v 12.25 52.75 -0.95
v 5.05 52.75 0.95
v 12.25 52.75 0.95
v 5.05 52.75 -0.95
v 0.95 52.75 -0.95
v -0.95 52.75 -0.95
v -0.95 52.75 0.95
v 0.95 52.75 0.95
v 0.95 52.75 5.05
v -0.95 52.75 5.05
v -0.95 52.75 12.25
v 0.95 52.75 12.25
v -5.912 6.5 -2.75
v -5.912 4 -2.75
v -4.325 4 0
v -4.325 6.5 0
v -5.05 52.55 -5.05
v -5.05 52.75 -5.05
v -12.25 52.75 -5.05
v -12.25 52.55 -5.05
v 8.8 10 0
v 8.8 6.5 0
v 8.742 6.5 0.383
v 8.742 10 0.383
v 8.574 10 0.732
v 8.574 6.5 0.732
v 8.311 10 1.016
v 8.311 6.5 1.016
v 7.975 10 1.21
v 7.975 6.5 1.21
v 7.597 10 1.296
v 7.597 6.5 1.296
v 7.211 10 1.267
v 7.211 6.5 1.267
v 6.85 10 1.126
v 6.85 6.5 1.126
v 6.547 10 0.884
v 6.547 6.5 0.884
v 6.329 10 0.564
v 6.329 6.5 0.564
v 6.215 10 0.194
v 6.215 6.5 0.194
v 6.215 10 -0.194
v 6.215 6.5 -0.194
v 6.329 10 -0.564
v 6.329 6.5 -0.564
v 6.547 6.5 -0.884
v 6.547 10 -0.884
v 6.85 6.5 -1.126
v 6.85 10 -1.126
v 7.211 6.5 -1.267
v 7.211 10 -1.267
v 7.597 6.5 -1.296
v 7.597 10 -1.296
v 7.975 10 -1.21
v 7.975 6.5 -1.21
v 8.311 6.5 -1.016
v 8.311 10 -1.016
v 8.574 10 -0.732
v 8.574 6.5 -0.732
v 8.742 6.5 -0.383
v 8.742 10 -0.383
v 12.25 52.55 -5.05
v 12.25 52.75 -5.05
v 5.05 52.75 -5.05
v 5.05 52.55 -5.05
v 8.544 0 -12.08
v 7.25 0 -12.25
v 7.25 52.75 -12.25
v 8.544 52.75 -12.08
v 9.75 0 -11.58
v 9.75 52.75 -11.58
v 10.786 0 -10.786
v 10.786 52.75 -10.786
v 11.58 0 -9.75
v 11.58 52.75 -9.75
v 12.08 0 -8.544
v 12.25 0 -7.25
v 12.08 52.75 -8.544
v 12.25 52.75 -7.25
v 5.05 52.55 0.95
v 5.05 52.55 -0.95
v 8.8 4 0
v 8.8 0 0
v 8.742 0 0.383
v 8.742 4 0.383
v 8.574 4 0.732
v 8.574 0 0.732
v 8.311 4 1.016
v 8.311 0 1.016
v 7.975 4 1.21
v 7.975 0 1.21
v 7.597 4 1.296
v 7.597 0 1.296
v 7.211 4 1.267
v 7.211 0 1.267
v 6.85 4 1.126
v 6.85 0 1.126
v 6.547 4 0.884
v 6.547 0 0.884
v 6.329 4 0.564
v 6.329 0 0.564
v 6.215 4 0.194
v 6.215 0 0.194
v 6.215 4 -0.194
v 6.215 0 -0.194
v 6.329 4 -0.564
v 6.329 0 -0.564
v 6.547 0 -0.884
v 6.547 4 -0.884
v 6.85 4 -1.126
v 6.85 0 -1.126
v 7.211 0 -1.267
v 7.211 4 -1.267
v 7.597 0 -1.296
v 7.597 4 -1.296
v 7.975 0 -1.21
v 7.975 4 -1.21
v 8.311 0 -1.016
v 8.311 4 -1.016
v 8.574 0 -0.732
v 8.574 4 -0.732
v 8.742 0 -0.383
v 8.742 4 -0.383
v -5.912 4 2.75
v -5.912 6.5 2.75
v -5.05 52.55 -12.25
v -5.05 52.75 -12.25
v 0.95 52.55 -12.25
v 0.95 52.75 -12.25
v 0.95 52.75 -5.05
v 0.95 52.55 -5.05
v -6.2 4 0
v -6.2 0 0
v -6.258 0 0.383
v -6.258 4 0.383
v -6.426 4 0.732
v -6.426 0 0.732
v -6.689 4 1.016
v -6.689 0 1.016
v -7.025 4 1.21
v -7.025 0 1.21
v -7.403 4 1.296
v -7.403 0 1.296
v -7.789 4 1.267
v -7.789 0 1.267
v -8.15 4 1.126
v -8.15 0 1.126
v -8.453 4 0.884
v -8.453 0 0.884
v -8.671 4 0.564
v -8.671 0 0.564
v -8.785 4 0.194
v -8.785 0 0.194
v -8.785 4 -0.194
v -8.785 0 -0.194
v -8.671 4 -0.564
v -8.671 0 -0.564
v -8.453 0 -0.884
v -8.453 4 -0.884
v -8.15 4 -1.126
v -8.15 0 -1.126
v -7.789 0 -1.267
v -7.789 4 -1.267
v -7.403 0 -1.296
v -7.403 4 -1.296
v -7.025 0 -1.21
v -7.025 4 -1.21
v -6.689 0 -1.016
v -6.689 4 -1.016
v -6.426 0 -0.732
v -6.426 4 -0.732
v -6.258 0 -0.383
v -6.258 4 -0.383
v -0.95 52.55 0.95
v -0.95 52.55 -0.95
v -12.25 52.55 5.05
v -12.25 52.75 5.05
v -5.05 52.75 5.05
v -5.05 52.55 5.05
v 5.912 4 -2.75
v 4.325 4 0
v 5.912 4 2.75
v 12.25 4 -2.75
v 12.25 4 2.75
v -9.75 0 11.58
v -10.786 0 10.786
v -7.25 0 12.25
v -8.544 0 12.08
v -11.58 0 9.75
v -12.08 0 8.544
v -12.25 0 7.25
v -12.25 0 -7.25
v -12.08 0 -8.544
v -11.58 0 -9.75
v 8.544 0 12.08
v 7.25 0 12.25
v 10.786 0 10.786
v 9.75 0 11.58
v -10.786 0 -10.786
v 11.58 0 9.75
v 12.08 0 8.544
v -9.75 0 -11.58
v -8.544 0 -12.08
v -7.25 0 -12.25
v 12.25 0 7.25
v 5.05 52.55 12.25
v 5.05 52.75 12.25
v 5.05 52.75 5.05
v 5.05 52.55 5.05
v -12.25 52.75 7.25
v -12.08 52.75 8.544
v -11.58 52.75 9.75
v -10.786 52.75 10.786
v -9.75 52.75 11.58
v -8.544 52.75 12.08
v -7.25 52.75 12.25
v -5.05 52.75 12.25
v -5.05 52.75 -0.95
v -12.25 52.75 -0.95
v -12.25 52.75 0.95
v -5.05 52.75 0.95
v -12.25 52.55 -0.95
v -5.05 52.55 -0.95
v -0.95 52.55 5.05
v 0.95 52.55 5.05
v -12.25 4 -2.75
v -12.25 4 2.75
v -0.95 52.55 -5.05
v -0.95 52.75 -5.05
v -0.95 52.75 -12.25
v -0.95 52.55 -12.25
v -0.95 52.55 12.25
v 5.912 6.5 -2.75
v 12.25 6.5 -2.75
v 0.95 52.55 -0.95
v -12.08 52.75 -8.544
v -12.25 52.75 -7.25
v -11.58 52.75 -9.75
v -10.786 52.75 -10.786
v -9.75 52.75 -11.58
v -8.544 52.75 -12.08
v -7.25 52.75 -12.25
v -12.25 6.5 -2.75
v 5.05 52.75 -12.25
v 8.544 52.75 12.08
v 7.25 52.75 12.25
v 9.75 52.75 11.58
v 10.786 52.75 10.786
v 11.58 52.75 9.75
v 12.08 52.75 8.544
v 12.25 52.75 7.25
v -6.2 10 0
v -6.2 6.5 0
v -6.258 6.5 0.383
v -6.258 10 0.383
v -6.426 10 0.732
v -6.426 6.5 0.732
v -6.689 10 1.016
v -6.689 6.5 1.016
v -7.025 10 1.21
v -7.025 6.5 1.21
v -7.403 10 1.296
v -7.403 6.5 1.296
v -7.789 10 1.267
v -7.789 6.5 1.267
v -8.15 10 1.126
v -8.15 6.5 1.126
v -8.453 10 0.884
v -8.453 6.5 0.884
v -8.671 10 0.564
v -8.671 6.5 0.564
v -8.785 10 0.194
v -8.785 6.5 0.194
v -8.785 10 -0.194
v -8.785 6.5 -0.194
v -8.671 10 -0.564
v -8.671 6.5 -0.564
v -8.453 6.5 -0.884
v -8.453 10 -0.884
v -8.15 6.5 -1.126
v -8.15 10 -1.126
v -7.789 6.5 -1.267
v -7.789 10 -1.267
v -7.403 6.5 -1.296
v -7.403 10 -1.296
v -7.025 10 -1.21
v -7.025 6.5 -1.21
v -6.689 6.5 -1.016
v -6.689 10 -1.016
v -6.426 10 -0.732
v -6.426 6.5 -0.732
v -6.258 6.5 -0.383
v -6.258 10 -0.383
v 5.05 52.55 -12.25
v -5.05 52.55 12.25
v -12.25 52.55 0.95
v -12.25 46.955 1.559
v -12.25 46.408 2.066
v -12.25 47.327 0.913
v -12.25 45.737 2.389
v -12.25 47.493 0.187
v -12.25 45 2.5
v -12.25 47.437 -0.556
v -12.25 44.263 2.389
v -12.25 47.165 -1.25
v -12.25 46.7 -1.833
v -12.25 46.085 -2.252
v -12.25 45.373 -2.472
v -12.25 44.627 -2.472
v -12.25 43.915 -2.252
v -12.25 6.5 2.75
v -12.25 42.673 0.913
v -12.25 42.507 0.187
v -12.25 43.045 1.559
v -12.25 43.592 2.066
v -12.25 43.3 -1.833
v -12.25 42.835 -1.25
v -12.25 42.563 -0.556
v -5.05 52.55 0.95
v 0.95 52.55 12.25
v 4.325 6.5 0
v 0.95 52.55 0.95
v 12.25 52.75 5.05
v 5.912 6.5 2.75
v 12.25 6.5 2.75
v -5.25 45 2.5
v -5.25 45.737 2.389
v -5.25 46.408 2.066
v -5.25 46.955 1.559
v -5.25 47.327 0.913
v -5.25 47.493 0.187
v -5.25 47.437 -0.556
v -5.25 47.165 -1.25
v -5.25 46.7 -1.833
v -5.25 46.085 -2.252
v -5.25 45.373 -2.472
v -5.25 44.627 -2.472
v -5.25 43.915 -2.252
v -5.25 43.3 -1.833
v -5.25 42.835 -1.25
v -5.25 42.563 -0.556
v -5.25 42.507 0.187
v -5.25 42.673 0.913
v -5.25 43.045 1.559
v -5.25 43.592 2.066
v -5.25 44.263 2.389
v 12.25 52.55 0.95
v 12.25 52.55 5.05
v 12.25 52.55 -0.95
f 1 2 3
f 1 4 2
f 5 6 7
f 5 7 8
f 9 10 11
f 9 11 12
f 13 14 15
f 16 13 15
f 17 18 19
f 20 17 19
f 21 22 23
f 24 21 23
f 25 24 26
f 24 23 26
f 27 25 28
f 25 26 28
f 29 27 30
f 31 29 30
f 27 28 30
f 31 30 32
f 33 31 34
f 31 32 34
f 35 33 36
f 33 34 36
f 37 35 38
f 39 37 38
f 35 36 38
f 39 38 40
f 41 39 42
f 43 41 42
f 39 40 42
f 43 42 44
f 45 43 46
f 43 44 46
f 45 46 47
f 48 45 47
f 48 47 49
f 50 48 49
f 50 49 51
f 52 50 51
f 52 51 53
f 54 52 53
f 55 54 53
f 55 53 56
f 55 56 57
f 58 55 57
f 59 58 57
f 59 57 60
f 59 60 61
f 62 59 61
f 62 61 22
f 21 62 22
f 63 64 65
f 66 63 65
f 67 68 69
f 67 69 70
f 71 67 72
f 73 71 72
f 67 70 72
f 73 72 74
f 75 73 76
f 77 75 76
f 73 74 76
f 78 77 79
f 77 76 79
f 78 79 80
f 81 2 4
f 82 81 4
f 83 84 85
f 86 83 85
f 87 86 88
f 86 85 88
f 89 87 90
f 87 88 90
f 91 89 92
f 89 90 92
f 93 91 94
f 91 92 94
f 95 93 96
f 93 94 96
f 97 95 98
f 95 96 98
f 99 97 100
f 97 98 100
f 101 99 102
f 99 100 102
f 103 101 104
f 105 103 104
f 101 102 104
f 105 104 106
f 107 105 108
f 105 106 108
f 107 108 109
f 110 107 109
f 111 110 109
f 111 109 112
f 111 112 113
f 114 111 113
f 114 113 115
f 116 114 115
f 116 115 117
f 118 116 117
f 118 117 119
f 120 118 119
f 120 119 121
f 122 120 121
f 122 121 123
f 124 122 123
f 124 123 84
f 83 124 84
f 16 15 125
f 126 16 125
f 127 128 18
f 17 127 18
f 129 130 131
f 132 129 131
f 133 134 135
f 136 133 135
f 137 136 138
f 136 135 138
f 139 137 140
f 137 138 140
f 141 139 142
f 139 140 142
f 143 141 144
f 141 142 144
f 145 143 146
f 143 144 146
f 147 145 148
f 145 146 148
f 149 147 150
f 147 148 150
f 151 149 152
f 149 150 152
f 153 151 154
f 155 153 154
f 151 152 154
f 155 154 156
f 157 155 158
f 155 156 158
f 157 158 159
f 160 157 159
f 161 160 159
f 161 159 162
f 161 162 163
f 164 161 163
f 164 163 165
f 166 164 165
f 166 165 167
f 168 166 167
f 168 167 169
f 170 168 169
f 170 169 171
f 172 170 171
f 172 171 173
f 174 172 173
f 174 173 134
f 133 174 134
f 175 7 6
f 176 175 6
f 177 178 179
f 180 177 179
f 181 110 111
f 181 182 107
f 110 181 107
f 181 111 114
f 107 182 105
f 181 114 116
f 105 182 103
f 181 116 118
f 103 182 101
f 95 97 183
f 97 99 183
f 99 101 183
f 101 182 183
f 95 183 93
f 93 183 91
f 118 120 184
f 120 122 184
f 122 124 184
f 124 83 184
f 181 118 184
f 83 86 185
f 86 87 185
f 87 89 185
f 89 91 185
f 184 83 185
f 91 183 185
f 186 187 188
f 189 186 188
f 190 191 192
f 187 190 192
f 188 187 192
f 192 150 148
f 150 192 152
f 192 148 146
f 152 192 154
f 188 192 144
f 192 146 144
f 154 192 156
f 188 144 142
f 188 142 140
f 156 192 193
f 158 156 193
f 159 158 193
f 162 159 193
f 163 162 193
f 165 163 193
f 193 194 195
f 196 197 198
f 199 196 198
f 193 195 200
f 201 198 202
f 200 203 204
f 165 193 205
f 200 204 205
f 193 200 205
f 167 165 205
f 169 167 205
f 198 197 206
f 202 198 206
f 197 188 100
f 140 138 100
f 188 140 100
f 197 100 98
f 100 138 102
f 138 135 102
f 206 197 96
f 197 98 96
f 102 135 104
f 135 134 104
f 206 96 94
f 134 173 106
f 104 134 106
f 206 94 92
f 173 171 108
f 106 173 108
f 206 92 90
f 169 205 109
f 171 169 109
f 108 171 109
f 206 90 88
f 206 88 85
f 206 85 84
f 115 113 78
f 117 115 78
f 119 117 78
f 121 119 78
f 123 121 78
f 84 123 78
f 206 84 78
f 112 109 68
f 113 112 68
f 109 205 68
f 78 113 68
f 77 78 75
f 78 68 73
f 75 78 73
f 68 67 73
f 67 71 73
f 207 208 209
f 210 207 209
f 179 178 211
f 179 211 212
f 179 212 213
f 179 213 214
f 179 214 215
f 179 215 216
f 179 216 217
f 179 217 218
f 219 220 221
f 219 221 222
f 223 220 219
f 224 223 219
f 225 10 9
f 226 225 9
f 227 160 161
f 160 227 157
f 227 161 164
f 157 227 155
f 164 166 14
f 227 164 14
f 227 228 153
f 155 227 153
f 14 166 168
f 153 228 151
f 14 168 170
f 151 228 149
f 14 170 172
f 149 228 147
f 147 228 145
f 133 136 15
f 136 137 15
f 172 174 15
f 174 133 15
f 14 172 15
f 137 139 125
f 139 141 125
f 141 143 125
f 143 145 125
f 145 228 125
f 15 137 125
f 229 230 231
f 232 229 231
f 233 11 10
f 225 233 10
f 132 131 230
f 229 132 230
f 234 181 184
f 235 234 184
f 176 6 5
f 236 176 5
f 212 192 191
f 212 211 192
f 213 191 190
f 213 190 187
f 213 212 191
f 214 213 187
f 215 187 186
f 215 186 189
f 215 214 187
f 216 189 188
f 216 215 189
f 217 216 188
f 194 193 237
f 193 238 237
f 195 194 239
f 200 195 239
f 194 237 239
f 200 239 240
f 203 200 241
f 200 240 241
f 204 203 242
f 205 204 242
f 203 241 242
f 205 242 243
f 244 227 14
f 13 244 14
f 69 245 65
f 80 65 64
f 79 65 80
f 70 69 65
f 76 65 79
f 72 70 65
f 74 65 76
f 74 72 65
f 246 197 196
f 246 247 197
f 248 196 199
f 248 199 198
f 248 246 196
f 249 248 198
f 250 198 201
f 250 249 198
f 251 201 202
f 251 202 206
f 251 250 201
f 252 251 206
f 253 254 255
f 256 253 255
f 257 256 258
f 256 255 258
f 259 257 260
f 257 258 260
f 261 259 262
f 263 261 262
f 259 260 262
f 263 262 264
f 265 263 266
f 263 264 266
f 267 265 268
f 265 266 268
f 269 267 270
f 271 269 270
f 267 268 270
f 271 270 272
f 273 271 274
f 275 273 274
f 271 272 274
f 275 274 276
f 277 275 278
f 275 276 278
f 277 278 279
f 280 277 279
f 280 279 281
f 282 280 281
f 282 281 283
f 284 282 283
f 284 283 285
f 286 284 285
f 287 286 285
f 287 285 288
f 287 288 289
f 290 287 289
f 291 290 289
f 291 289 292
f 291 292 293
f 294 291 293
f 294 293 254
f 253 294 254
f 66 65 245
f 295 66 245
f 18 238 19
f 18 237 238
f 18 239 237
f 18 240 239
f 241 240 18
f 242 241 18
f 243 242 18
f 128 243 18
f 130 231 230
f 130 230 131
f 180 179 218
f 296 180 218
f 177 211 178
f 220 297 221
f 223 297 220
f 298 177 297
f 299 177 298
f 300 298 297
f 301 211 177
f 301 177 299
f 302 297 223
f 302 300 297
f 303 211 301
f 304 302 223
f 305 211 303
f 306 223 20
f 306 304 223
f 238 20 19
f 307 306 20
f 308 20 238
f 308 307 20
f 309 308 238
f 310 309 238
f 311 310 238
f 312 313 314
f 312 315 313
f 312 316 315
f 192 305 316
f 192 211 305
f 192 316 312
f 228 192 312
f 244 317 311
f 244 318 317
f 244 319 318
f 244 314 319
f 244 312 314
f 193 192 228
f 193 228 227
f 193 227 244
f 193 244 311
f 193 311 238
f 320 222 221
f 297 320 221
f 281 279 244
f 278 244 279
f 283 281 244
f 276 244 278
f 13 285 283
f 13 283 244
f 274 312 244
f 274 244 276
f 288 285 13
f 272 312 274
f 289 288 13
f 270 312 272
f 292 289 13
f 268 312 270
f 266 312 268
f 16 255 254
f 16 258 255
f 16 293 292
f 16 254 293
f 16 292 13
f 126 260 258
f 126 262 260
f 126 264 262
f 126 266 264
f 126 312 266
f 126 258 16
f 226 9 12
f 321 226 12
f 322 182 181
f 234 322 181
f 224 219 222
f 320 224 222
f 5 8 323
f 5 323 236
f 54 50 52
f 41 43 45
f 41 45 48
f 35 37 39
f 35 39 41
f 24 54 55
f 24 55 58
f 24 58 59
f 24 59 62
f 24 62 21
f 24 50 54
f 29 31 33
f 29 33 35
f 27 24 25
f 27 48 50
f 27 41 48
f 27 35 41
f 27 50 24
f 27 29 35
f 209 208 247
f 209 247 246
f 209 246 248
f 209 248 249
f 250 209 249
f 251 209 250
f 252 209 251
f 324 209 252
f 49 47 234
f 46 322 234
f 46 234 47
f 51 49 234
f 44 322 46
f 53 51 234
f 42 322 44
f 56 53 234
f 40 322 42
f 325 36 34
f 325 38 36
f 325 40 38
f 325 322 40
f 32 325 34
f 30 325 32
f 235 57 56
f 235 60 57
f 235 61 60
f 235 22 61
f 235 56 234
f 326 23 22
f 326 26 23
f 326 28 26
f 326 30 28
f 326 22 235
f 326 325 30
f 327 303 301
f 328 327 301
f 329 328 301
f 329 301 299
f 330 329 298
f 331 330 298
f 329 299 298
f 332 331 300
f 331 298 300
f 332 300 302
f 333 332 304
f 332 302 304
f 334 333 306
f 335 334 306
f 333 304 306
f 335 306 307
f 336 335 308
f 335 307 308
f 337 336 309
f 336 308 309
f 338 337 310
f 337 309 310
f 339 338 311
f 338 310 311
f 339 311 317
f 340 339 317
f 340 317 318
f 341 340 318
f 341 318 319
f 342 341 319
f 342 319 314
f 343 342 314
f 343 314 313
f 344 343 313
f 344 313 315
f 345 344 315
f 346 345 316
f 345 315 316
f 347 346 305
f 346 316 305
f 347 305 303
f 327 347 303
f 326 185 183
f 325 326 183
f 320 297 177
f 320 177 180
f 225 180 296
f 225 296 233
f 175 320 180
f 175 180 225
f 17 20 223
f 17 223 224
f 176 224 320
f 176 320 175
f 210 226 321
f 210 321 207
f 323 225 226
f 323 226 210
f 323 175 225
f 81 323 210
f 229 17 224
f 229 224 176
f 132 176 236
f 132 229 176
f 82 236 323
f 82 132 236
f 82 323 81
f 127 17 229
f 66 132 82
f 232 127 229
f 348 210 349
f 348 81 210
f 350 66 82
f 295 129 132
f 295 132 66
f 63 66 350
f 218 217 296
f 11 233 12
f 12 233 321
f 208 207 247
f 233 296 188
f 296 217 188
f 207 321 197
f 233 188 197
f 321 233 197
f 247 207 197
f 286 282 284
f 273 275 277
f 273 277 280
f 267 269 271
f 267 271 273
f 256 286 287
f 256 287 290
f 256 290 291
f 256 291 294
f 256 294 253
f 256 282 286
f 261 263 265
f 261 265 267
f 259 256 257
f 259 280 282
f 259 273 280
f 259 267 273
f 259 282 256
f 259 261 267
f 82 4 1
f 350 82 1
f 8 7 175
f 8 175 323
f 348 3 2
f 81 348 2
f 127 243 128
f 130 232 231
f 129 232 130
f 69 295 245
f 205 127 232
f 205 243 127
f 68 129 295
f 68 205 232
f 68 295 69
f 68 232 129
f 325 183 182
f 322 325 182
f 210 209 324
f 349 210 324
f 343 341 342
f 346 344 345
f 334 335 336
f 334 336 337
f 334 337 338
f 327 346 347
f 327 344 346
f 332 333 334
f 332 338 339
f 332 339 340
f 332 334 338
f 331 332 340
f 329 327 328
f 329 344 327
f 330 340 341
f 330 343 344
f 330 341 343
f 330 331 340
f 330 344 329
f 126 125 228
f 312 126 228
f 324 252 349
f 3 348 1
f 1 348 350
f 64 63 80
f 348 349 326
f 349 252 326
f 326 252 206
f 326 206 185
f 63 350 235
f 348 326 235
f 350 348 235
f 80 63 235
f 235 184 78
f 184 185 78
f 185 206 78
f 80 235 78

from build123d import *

# Parameters (mm, degrees)
SKETCH1_W           = 24.5
SKETCH1_H           = 24.5
BOSS_EXTRUDE1_DEPTH = 52.75
SKETCH3_R           = 1.3
CUT_EXTRUDE1_DEPTH  = 10
SKETCH4_W           = 1.9
SKETCH4_H           = 1.9
CUT_EXTRUDE2_DEPTH  = 0.2
FILLET1_R           = 5
CUT_EXTRUDE3_START  = -4
CUT_EXTRUDE3_DEPTH  = 2.5
SKETCH6_R           = 2.5
CUT_EXTRUDE4_DEPTH  = 7


with BuildPart() as part:
    # Sketch1 → Boss-Extrude1 (new body)
    with BuildSketch(Plane(origin=(0, 0, 0), x_dir=(1, 0, 0), z_dir=(0, 1, 0))):
        Rectangle(SKETCH1_W, SKETCH1_H)
    extrude(amount=BOSS_EXTRUDE1_DEPTH)

    # Sketch3 → Cut-Extrude1 (cut)
    with BuildSketch(Plane.XZ):
        with Locations((-7.5, 0)):
            Circle(SKETCH3_R)
        with Locations((7.5, 0)):
            Circle(SKETCH3_R)
    extrude(amount=-CUT_EXTRUDE1_DEPTH, mode=Mode.SUBTRACT)

    # Sketch4 → Cut-Extrude2 (cut)
    with BuildSketch(Plane(origin=(0, 52.75, 0), x_dir=(1, 0, 0), z_dir=(0, 1, 0))):
        Polygon((0.95, 12.25), (0.95, 5.05), (-0.95, 5.05), (-0.95, 12.25), (-5.05, 12.25), (-5.05, 5.05), (-12.25, 5.05), (-12.25, 0.95), (-5.05, 0.95), (-5.05, -0.95), (-12.25, -0.95), (-12.25, -5.05), (-5.05, -5.05), (-5.05, -12.25), (-0.95, -12.25), (-0.95, -5.05), (0.95, -5.05), (0.95, -12.25), (5.05, -12.25), (5.05, -5.05), (12.25, -5.05), (12.25, -0.95), (5.05, -0.95), (5.05, 0.95), (12.25, 0.95), (12.25, 5.05), (5.05, 5.05), (5.05, 12.25), align=None)
        Rectangle(SKETCH4_W, SKETCH4_H, mode=Mode.SUBTRACT)
    extrude(amount=-CUT_EXTRUDE2_DEPTH, mode=Mode.SUBTRACT)

    # Fillet1
    fillet1_edges = [part.edges().sort_by_distance(p)[0] for p in [
        (12.25, 26.375, 12.25),
        (-12.25, 26.375, 12.25),
        (-12.25, 26.375, -12.25),
        (12.25, 26.375, -12.25),
    ]]
    fillet(fillet1_edges, radius=FILLET1_R)

    # Sketch5 → Cut-Extrude3 (cut)
    with BuildSketch(Plane.XZ.offset(CUT_EXTRUDE3_START)):
        Polygon((-9.08771324, -2.75), (-5.91228676, -2.75), (-4.324573519, 0), (-5.91228676, 2.75), (-9.08771324, 2.75), (-14.788950872, 2.75), (-14.788950872, -2.75), align=None)
        Polygon((9.08771324, 2.75), (5.91228676, 2.75), (4.324573519, 0), (5.91228676, -2.75), (9.08771324, -2.75), (14.28132796, -2.75), (14.28132796, 2.75), align=None)
    extrude(amount=-CUT_EXTRUDE3_DEPTH, mode=Mode.SUBTRACT)

    # Sketch6 → Cut-Extrude4 (cut)
    with BuildSketch(Plane.ZY.offset(12.25)):
        with Locations((0, 45)):
            Circle(SKETCH6_R)
    extrude(amount=-CUT_EXTRUDE4_DEPTH, mode=Mode.SUBTRACT)


solid = part.part
